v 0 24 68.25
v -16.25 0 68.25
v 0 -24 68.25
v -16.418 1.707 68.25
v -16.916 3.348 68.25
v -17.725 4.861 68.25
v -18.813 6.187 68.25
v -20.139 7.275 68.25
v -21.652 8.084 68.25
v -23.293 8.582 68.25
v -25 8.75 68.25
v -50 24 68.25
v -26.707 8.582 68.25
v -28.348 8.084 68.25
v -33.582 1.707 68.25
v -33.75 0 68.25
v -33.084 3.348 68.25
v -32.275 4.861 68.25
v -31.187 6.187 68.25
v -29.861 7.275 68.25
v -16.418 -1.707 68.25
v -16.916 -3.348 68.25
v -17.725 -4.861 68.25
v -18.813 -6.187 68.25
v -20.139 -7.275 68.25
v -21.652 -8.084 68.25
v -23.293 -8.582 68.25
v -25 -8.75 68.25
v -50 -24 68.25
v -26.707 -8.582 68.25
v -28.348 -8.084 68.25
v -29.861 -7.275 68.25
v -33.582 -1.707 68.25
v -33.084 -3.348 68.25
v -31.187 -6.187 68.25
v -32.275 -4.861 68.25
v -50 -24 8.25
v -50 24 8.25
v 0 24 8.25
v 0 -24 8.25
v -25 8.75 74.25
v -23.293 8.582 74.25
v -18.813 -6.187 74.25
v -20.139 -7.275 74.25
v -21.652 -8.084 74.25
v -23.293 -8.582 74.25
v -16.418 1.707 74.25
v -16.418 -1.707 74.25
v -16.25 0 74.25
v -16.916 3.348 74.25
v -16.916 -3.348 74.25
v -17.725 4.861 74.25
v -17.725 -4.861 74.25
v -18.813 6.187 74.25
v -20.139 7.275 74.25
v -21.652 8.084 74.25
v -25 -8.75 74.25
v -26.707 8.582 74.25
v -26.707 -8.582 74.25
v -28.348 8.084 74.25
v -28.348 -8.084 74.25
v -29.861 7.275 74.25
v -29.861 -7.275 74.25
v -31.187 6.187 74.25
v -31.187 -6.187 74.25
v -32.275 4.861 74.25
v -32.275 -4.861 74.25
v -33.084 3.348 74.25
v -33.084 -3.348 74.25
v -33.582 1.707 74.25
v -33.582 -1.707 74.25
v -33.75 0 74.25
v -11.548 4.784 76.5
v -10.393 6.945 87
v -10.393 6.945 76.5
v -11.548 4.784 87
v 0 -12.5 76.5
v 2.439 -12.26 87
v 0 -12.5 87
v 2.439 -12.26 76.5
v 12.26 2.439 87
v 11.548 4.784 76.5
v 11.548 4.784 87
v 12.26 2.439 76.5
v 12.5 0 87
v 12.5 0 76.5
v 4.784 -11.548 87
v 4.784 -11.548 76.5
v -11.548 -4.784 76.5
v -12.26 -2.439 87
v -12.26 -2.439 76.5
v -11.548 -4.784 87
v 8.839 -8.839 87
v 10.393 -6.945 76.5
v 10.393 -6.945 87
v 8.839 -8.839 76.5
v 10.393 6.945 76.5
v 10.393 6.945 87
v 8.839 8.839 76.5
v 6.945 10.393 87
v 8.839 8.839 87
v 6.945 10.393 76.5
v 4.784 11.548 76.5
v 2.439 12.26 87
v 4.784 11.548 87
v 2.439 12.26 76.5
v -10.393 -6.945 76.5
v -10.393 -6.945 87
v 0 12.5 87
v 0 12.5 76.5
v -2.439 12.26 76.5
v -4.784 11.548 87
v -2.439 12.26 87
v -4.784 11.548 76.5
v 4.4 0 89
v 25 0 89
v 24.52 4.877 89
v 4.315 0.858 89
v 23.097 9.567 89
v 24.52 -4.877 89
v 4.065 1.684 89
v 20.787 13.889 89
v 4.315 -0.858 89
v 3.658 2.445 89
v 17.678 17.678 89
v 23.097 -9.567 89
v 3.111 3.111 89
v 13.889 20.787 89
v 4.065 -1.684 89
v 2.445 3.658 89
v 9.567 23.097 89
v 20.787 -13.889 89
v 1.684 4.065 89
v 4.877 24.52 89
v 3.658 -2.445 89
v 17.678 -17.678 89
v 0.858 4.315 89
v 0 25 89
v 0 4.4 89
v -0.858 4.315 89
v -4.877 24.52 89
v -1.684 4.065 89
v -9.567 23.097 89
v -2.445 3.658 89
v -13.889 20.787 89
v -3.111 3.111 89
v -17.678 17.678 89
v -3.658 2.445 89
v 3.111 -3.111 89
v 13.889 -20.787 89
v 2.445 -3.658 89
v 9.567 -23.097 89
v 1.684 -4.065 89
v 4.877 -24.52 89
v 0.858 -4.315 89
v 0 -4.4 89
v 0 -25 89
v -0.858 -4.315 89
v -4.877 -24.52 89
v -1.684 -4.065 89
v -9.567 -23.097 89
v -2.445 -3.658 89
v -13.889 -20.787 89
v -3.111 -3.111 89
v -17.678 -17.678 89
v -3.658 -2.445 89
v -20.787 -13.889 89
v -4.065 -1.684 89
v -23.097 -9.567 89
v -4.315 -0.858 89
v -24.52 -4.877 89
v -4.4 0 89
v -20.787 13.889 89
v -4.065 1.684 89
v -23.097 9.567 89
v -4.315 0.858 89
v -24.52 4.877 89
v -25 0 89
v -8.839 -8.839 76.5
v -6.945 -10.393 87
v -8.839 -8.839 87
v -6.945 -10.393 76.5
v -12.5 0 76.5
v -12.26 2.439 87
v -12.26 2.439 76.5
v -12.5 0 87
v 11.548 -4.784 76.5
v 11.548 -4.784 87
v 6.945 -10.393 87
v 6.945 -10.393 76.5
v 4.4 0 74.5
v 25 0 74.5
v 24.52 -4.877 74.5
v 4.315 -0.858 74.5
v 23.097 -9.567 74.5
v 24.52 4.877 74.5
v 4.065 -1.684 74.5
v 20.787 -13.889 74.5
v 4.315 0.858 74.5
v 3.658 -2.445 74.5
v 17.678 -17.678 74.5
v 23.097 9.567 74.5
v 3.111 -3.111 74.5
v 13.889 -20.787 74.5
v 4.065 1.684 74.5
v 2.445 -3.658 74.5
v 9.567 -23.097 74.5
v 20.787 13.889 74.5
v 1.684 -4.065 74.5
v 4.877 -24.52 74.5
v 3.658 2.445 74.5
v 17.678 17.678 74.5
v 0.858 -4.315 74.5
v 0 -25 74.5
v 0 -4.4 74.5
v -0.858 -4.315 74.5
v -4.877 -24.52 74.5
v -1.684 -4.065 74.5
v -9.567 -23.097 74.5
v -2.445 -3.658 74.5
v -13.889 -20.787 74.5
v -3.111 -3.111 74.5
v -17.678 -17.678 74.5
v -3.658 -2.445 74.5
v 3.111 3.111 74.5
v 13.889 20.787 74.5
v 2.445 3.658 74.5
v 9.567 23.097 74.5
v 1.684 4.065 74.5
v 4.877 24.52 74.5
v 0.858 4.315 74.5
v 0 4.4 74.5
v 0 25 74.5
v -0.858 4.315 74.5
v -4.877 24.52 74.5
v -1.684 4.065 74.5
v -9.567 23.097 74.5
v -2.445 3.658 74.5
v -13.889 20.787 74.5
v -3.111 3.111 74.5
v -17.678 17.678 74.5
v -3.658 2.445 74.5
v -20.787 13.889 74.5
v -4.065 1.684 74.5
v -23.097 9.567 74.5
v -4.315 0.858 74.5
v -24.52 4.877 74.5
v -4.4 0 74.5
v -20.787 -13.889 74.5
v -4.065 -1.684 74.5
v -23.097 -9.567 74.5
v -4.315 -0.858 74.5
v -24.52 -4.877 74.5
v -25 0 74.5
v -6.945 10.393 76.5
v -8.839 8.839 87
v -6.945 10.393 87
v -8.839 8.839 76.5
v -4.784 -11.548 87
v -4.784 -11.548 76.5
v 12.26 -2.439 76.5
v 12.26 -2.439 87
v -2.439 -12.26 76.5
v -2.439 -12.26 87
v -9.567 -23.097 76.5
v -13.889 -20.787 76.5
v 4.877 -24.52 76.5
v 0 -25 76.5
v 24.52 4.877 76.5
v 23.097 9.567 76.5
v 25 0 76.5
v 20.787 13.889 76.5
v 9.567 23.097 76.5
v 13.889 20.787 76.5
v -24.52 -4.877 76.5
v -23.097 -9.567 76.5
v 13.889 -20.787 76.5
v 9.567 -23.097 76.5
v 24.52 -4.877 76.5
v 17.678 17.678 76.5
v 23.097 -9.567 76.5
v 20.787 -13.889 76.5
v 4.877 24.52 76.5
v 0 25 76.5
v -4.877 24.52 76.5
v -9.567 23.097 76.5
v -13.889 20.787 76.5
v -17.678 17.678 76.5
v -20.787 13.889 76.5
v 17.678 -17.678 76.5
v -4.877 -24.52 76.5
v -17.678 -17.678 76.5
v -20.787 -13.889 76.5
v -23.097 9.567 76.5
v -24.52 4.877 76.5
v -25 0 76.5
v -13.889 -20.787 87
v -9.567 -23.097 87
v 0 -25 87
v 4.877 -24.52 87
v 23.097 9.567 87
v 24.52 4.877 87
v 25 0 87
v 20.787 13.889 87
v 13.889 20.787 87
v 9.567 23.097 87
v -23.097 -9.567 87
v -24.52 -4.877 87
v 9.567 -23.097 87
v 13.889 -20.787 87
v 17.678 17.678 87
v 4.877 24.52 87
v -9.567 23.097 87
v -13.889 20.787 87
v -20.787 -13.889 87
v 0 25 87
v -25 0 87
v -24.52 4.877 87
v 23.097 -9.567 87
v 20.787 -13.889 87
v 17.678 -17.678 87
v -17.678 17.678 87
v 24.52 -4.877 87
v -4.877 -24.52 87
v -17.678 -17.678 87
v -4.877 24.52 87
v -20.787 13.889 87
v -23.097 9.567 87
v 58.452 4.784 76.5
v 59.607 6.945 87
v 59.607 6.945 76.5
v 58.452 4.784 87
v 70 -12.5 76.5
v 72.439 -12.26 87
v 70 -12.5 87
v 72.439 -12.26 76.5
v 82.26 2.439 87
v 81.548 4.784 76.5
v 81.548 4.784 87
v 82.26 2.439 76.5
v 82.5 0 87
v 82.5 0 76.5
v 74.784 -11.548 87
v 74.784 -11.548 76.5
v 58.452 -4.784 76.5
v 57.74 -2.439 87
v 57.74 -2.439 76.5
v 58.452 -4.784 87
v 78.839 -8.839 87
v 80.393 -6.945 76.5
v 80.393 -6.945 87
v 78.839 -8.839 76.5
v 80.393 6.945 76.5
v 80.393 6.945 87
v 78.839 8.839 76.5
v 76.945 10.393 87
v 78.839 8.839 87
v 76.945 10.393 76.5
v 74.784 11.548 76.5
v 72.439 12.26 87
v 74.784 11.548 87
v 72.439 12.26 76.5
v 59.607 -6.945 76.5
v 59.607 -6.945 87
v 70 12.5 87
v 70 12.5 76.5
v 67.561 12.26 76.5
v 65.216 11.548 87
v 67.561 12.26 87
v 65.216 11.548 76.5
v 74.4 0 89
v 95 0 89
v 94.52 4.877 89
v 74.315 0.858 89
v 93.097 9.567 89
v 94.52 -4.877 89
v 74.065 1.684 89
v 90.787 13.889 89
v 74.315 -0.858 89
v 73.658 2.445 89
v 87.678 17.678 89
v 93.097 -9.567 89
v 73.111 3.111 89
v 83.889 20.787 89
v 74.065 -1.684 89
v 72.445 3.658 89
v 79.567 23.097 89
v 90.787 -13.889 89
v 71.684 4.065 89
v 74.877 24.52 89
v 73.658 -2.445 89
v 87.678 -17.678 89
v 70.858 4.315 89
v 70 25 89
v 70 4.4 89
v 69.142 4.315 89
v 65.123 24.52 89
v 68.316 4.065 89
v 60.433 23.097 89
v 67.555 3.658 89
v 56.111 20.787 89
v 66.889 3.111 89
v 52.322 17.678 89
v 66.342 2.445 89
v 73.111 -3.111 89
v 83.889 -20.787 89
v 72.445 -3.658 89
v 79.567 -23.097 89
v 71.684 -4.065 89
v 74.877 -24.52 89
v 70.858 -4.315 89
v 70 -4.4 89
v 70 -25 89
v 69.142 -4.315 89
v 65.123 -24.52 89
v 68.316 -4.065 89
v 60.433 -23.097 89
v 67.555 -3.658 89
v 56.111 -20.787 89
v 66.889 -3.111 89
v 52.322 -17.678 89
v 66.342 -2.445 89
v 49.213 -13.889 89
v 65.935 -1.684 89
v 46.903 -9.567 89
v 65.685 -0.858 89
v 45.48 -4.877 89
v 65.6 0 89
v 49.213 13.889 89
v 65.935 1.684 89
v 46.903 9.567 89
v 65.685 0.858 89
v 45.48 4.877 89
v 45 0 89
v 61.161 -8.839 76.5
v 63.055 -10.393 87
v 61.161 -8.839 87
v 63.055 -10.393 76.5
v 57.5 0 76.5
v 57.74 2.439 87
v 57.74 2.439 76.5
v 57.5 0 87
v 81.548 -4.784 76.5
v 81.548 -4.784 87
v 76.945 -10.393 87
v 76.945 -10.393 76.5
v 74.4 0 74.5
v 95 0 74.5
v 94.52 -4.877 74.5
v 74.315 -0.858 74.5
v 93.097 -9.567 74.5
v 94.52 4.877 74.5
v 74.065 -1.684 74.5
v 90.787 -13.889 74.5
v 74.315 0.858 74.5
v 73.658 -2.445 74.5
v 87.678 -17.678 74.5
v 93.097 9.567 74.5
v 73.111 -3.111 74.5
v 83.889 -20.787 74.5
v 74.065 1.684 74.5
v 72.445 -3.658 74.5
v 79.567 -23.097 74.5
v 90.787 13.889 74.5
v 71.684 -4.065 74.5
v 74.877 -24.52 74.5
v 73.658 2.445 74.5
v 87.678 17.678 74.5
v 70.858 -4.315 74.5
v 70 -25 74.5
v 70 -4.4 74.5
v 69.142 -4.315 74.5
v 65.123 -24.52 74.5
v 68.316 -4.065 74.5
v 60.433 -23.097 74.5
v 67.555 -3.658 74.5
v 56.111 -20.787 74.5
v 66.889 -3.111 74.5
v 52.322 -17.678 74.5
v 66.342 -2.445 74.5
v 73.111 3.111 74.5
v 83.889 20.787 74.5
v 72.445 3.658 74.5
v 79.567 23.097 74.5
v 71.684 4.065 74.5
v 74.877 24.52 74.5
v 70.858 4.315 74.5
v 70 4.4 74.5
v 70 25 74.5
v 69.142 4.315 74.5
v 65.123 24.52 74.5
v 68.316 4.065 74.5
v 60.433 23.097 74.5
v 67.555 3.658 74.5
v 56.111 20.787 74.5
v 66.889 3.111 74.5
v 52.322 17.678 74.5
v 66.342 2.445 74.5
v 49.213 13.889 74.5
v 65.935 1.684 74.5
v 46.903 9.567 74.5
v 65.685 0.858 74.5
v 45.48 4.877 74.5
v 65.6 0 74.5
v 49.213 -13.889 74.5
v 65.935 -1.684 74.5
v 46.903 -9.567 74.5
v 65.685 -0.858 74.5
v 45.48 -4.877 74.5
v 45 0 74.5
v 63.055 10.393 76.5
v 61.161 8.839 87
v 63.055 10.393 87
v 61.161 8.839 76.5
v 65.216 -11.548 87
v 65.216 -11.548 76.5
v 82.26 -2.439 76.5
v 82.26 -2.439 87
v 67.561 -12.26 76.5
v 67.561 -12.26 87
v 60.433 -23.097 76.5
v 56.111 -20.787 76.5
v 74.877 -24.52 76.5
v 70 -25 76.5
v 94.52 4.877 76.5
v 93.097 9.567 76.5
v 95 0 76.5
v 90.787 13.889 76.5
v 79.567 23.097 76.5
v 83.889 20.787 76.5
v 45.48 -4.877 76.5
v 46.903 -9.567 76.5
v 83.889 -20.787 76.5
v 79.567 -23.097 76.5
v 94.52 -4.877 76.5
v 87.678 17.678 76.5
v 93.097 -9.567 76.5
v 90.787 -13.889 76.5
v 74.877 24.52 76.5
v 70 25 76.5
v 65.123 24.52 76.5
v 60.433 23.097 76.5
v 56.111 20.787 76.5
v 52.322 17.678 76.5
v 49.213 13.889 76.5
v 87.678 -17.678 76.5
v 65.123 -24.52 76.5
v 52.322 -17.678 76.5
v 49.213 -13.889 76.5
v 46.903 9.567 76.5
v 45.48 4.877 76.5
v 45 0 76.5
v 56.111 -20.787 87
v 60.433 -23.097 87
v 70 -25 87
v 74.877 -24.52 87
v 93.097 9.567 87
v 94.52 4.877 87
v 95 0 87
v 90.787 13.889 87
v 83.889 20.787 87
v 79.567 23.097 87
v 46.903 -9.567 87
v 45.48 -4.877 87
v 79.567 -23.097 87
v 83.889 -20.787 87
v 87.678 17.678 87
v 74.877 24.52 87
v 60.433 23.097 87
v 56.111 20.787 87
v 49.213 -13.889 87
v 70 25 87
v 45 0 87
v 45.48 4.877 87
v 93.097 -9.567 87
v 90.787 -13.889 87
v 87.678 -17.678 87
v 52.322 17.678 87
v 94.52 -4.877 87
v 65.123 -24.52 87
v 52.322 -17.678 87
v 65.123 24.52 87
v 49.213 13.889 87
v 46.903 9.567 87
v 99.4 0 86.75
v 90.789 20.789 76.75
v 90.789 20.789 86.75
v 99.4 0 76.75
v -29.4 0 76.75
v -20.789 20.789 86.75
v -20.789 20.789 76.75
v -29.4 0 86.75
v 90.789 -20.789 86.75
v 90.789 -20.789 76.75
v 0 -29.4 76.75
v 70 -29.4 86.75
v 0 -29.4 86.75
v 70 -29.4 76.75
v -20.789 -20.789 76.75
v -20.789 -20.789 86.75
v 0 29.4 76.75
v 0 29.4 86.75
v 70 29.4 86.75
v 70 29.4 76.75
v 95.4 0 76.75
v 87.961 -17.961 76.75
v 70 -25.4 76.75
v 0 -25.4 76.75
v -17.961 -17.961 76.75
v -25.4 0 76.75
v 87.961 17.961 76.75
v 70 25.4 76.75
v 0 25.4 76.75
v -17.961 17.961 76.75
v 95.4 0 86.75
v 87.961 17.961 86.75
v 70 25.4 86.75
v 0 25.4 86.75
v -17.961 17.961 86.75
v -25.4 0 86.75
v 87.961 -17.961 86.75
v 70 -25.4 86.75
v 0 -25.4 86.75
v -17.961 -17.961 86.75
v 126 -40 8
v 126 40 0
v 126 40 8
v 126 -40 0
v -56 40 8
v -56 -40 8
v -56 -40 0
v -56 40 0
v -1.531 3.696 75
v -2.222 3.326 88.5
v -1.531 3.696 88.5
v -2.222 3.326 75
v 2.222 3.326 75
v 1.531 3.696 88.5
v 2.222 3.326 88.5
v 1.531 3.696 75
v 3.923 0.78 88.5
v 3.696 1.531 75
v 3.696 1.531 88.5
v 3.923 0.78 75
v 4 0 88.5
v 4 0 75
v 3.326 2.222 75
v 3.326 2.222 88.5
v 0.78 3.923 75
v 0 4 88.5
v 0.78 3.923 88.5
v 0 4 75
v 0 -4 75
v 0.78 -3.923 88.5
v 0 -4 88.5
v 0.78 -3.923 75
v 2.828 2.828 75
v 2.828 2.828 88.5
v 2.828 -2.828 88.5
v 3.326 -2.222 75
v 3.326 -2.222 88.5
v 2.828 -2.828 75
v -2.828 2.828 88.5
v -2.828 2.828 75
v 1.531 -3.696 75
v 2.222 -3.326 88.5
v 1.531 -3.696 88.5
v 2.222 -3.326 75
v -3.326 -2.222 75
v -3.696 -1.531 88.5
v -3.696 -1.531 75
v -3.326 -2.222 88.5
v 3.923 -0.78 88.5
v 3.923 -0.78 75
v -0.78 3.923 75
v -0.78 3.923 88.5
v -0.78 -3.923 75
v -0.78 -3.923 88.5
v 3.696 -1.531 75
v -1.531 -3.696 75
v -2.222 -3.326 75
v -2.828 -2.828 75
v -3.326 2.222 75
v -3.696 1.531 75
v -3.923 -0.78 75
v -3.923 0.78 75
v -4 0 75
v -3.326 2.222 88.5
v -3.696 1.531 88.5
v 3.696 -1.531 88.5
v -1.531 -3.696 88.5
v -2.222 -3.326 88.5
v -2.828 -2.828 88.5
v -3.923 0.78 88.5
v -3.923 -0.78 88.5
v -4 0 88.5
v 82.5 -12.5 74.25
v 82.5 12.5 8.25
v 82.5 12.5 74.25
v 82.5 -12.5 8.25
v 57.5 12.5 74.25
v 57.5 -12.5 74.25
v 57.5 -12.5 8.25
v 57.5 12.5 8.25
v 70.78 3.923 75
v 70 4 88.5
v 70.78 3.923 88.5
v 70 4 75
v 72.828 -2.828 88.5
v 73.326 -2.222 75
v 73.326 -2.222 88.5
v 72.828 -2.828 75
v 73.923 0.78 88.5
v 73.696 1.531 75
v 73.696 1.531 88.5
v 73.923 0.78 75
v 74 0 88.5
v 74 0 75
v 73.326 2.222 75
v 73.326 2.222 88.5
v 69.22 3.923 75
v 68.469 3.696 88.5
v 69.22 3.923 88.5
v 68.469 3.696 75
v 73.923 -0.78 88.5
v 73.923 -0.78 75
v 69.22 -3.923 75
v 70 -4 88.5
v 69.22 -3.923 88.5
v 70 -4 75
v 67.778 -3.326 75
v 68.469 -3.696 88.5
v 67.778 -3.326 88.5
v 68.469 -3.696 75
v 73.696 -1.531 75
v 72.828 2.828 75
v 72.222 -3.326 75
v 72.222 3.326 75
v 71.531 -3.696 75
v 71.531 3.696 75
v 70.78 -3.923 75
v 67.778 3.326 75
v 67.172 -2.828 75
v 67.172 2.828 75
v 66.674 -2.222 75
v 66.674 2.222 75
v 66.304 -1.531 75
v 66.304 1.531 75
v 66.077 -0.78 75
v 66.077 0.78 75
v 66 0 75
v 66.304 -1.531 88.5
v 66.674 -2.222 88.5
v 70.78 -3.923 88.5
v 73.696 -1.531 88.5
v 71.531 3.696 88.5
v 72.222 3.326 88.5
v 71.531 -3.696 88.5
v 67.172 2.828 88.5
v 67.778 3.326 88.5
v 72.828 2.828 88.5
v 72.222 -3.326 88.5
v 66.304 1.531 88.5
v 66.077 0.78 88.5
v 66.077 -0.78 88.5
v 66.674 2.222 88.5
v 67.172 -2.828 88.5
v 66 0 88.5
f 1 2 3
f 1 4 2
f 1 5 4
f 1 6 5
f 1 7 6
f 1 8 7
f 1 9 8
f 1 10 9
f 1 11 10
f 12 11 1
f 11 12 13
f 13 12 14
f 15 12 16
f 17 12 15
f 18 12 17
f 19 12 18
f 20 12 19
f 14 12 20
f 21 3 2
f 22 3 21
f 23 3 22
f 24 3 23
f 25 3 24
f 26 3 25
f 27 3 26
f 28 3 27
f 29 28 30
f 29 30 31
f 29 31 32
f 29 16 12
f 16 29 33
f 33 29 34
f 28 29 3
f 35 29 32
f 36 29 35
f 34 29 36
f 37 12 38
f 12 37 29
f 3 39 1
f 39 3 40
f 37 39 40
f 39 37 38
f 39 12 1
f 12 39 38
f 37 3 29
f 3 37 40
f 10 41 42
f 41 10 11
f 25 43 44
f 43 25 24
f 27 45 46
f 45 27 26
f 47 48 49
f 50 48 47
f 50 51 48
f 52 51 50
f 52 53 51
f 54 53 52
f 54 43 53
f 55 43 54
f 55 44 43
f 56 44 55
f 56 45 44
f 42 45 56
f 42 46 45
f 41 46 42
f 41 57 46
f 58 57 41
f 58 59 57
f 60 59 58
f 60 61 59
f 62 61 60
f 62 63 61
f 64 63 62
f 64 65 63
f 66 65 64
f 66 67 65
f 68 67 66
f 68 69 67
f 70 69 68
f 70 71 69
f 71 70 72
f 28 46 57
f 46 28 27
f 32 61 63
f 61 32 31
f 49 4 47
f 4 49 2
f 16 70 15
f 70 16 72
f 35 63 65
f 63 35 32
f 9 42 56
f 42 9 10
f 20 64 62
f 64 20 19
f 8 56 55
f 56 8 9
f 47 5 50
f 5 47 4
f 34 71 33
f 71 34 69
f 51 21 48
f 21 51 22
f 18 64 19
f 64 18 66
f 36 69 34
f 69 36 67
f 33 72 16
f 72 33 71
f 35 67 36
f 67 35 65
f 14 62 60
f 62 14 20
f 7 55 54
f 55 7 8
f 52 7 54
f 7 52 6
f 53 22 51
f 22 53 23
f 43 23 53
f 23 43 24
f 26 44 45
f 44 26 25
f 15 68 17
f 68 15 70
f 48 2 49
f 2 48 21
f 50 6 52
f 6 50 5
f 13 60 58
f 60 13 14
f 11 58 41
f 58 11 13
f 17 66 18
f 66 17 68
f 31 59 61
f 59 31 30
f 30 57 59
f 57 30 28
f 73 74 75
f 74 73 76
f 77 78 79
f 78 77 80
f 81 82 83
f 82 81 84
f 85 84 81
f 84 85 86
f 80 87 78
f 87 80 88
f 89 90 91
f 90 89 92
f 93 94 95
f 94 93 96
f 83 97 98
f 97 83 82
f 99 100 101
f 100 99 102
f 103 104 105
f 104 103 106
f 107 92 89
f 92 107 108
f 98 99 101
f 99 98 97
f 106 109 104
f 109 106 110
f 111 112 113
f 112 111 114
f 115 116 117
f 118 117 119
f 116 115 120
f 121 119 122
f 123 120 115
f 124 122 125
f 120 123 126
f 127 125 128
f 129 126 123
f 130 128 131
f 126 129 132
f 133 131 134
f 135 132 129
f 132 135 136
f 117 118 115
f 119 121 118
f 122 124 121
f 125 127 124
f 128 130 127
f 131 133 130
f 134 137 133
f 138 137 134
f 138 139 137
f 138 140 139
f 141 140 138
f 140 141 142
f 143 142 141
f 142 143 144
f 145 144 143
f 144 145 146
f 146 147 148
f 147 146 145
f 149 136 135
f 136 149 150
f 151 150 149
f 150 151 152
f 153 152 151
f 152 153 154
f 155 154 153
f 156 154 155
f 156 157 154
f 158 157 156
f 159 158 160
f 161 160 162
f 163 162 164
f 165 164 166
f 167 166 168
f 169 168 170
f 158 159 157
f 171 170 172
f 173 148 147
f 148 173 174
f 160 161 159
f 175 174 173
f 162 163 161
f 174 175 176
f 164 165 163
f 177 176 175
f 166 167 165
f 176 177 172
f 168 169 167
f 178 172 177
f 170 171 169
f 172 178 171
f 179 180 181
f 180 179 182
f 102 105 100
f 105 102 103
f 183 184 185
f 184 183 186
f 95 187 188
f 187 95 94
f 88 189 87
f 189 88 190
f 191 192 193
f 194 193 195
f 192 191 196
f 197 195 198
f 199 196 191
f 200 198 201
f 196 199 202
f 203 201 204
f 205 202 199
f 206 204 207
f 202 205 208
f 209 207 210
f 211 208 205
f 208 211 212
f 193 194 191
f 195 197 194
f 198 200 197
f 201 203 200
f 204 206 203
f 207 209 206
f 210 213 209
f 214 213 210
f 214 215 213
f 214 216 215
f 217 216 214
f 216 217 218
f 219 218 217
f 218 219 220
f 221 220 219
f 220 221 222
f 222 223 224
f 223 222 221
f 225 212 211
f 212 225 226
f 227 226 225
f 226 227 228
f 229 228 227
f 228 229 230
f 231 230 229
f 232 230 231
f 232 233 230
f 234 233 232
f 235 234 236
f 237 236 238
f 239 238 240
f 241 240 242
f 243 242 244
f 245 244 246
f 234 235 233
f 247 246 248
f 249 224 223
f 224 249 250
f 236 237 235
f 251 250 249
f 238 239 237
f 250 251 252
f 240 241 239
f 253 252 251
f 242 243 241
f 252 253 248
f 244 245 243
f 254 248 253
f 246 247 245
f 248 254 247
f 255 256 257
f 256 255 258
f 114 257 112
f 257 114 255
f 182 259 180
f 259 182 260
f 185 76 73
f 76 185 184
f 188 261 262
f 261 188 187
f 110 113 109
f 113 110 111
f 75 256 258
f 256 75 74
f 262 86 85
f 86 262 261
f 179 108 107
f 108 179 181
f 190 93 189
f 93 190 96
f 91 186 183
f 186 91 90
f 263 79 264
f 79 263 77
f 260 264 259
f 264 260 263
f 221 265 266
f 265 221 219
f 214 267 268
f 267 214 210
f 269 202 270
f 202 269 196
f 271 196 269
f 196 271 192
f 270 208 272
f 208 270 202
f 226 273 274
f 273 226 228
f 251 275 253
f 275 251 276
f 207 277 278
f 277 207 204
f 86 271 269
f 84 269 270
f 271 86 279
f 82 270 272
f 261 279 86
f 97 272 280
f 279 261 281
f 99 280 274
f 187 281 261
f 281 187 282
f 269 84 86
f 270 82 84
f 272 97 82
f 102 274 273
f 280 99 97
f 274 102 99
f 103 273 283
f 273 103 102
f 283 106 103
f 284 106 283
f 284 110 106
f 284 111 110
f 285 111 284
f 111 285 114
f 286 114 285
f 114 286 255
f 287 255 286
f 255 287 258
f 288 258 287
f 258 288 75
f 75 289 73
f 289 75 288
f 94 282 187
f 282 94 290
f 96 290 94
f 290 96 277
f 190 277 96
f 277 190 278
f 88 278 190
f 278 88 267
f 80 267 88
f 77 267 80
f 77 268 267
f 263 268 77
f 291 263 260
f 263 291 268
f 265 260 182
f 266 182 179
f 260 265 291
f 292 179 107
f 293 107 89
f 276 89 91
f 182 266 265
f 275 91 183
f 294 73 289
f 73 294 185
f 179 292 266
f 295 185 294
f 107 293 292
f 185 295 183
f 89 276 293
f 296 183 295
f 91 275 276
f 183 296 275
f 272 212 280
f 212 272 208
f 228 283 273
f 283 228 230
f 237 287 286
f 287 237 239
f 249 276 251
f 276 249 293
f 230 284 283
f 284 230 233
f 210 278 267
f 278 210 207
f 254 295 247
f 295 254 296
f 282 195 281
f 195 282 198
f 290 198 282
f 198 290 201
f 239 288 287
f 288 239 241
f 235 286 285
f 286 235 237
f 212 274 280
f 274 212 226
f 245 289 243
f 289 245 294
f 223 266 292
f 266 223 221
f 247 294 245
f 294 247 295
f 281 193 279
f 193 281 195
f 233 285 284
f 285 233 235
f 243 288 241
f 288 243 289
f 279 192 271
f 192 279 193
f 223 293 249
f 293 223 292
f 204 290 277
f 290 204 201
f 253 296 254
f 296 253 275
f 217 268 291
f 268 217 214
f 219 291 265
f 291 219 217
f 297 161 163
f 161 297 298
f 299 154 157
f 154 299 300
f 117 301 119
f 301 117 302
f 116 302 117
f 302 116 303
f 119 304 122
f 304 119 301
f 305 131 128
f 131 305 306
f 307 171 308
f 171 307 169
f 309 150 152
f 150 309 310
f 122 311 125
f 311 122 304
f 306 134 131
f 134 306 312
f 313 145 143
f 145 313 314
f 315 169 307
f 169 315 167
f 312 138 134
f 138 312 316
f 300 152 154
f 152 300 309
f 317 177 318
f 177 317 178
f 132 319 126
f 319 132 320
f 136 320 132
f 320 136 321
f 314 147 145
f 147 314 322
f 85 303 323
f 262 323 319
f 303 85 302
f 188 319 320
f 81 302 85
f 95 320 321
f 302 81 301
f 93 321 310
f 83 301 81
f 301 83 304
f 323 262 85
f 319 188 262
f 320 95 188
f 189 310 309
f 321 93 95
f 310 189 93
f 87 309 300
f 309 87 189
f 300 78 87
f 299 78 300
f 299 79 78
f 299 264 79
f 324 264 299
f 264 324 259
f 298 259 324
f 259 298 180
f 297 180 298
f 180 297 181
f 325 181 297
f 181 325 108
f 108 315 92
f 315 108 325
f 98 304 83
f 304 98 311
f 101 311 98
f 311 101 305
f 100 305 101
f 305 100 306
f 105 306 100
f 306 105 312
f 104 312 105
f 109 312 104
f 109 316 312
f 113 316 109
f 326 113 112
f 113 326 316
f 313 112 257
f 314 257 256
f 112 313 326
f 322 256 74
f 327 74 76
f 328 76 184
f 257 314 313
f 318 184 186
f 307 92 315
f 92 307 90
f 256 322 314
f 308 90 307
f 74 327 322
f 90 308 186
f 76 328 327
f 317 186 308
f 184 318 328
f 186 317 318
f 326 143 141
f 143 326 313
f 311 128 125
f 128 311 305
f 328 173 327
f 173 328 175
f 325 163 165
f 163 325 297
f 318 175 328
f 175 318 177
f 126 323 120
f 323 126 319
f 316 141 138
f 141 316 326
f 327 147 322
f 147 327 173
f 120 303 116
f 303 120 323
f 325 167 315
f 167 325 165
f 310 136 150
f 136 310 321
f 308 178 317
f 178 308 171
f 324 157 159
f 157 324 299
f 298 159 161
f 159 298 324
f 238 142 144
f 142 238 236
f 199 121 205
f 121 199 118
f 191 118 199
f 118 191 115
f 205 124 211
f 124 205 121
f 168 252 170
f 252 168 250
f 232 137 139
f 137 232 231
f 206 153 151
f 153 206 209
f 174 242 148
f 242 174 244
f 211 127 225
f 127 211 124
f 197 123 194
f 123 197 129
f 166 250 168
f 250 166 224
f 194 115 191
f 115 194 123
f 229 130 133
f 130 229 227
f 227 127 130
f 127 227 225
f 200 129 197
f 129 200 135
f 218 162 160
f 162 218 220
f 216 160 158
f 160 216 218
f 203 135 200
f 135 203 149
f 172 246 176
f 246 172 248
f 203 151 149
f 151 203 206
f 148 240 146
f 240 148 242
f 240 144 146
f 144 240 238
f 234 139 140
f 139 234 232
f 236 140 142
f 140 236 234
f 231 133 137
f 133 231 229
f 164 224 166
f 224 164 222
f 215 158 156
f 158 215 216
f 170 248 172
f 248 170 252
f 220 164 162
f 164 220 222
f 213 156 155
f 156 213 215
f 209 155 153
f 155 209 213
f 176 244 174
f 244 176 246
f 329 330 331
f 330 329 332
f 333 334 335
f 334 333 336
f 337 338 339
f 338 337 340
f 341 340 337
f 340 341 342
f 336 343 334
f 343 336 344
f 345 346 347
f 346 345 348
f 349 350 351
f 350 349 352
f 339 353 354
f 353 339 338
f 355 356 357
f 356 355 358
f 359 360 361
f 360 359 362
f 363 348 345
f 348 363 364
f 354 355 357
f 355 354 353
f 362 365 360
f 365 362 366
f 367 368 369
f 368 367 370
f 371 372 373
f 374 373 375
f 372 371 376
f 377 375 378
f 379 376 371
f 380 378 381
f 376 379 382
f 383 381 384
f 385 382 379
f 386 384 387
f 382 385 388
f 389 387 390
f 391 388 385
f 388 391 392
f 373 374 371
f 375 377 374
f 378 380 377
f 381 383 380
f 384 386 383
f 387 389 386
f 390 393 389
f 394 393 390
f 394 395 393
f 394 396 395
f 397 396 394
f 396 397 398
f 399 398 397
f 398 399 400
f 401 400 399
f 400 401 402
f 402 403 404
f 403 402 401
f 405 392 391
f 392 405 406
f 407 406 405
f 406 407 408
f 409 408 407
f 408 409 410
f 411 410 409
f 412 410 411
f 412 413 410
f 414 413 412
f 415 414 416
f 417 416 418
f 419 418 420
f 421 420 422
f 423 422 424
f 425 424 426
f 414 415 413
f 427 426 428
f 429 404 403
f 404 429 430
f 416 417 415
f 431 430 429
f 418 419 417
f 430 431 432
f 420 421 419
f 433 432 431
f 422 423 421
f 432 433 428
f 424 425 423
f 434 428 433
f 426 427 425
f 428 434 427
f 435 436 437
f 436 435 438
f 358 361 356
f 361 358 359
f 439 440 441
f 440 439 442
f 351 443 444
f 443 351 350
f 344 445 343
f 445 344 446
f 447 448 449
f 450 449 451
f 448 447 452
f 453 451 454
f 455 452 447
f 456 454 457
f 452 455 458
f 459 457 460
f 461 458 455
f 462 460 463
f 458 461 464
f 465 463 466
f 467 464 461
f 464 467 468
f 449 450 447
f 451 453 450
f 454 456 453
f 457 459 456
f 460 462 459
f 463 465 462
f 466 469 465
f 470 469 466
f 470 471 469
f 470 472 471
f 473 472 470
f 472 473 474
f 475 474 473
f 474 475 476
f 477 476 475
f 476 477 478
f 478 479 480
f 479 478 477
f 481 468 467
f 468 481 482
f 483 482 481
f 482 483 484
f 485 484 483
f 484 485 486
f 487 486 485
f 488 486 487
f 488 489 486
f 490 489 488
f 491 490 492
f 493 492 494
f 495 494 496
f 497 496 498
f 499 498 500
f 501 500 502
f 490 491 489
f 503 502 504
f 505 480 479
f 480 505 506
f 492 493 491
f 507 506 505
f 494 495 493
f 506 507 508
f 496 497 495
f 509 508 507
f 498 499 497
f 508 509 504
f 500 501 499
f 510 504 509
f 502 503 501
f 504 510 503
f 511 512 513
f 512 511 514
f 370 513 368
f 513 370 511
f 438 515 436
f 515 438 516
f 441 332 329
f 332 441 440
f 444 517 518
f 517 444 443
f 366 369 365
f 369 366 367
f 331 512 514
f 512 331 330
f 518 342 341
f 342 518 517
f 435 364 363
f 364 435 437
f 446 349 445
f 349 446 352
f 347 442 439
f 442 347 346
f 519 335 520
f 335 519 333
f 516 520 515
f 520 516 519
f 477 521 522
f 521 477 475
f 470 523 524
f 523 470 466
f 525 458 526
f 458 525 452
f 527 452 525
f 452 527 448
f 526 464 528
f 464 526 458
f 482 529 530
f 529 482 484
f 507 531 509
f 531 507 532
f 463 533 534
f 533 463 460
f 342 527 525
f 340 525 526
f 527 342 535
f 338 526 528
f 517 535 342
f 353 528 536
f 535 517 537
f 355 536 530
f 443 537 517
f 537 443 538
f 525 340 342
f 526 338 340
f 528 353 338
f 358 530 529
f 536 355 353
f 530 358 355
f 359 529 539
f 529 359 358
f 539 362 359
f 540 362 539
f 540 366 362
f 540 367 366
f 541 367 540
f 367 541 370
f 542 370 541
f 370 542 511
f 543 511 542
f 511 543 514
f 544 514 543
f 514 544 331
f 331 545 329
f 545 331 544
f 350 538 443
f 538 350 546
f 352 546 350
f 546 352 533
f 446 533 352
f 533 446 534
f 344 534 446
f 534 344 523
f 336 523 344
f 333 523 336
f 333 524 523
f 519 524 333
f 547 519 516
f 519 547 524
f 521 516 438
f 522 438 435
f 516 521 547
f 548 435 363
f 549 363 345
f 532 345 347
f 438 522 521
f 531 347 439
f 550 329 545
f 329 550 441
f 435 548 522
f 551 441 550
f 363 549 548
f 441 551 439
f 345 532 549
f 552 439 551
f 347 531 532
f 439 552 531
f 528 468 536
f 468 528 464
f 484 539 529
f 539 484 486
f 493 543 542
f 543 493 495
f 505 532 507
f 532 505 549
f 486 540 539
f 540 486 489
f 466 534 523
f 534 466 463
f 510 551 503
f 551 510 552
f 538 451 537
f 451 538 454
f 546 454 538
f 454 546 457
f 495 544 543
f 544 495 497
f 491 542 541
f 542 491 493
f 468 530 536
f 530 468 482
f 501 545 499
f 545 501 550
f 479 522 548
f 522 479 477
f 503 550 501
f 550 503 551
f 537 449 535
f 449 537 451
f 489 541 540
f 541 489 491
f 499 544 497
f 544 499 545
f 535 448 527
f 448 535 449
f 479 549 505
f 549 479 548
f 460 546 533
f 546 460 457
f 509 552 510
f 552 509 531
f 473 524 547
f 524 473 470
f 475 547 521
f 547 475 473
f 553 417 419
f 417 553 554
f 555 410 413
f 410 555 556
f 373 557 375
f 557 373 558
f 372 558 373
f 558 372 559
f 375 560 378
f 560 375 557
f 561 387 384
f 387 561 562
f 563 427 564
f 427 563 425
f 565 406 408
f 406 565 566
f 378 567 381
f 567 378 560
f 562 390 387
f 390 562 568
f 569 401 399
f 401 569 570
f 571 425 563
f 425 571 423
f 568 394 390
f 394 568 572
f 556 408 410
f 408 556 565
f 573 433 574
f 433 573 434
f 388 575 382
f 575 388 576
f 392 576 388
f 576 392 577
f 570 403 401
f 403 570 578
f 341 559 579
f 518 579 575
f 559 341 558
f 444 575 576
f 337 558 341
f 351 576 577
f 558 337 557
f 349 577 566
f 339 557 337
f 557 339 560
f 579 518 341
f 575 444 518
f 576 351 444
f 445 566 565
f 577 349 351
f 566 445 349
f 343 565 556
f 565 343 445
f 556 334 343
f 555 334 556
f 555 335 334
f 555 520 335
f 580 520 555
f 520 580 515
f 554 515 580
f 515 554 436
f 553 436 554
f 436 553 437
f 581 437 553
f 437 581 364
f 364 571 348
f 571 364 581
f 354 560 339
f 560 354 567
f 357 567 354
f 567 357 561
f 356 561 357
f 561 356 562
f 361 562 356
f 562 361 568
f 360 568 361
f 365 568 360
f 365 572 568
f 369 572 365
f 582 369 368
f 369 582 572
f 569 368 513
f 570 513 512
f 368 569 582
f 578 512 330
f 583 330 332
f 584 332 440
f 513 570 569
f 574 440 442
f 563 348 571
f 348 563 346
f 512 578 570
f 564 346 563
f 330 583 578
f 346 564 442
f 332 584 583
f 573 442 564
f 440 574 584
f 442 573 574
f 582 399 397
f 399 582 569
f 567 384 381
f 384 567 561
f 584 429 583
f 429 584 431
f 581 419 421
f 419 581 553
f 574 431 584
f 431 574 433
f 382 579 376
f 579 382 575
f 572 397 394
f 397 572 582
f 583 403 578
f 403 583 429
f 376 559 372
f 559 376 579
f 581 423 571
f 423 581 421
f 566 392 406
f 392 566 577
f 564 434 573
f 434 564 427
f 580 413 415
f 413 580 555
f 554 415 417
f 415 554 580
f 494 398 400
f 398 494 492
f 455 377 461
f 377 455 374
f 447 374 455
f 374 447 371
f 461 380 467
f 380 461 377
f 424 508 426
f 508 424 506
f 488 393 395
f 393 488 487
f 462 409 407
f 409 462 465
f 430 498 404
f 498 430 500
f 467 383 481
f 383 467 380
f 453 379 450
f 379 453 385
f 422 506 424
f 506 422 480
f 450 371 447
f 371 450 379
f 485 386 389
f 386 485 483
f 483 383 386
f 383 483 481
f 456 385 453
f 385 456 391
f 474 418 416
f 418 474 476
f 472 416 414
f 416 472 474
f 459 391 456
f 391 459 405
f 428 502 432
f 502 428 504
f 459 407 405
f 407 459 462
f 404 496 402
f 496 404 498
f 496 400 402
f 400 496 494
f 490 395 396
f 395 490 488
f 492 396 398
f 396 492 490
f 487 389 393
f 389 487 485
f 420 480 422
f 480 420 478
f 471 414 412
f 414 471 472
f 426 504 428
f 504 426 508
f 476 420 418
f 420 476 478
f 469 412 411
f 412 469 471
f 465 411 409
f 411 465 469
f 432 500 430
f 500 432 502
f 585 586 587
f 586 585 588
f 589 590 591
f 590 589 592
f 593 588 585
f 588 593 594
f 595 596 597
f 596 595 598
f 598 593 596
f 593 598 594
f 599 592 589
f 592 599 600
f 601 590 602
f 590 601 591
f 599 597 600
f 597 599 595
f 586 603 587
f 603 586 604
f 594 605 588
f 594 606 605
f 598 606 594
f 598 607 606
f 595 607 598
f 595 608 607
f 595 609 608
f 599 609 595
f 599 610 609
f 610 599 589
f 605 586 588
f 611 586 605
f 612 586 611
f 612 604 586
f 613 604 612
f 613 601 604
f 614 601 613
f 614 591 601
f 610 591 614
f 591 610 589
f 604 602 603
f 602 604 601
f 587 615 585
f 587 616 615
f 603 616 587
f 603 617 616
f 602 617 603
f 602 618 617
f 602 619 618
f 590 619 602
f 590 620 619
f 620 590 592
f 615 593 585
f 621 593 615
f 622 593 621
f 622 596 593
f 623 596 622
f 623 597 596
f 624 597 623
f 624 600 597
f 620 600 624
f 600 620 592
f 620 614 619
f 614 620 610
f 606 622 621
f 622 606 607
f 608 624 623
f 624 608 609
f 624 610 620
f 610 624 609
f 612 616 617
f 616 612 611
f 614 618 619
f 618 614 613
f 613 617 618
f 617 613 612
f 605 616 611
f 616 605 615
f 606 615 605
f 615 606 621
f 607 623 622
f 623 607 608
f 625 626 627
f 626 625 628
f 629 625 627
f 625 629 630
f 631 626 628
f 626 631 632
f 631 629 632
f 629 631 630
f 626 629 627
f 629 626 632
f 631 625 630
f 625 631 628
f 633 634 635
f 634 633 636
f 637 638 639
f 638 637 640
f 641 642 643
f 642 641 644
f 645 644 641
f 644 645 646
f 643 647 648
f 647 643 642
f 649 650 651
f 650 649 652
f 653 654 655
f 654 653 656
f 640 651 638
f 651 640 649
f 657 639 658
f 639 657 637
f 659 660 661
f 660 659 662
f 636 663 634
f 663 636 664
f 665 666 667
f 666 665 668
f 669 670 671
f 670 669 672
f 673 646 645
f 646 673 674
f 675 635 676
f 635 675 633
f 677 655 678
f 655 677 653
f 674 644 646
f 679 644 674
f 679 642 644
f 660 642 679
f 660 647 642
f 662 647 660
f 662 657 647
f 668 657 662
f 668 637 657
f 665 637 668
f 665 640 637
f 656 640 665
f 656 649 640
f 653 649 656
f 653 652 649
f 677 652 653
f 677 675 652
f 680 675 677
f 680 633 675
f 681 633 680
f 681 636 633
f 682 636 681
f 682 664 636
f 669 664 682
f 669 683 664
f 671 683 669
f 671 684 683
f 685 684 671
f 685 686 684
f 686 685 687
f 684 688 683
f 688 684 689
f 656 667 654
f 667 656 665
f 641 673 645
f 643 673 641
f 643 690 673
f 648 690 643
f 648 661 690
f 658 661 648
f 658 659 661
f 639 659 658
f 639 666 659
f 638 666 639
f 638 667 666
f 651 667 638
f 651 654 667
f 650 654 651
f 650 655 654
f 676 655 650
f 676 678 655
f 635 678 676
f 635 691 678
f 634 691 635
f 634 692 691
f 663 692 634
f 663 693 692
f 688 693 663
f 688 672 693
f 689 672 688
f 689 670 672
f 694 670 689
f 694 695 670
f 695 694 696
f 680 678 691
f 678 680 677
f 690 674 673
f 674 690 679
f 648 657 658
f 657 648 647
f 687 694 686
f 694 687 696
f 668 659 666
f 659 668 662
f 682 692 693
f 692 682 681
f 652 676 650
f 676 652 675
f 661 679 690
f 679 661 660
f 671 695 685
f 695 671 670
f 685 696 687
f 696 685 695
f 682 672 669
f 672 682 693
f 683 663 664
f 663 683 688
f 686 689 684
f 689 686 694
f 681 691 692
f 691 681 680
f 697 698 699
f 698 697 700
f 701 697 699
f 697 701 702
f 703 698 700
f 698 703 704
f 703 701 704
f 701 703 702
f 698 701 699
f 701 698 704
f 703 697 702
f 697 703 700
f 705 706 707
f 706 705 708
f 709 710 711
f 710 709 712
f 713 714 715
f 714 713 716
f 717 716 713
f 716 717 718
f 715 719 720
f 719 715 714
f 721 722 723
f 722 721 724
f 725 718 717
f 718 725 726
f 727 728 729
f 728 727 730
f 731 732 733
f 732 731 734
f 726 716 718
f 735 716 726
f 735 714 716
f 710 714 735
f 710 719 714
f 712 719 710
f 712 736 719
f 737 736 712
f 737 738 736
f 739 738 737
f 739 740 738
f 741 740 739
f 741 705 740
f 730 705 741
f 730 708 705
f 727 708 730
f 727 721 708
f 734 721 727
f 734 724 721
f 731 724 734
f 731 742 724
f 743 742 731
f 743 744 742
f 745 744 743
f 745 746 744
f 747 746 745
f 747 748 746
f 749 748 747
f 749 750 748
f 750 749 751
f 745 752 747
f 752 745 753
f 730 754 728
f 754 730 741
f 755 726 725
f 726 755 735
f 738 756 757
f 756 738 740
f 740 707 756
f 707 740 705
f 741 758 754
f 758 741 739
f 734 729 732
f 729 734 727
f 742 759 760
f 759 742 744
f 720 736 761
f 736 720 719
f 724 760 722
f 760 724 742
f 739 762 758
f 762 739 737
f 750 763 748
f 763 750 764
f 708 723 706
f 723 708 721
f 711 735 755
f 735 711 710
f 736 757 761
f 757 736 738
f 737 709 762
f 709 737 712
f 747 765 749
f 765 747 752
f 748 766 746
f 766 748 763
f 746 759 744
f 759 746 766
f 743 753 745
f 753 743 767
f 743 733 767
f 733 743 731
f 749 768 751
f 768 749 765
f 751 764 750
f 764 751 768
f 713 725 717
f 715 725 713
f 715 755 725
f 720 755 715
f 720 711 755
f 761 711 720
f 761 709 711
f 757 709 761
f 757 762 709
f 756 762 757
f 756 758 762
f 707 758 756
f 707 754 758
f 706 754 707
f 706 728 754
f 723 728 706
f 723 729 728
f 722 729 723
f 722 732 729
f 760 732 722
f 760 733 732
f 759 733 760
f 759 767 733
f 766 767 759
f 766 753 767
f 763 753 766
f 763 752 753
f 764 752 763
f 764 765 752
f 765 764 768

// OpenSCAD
$fn = 32;

// ------------------------------------------------------------------------
// Motor belt drive: span 70 mm, pulleys d50, belt 10 mm wide
// Every part is its own module, assembly() places every instance.
// ------------------------------------------------------------------------

// --- part 1 ---
module base_plate() {
  difference() {
    translate([-91, -40, 0]) cube([182, 80, 8]);
  }
}

// --- part 2 ---
module motor() {
  union() {
    translate([-30, -24, 0]) cube([60, 48, 50]);
    translate([33, 0, 25]) rotate([0, 90, 0]) cylinder(h = 6, d = 17.5, center = true);
  }
}

// --- part 3 ---
module drive_shaft() {
  translate([0, 0, -6.75]) cylinder(h = 13.5, d = 8);
}

// --- part 4 ---
module pulley_drive() {
  difference() {
    union() {
      cylinder(h = 14.5, d = 25);
      cylinder(h = 2, d = 50);
      translate([0, 0, 12.5]) cylinder(h = 2, d = 50);
    }
    translate([0, 0, -1]) cylinder(h = 16.5, d = 8.8);
  }
}

// --- part 5 ---
module idler_post() {
  translate([-12.5, -12.5, 0]) cube([25, 25, 66]);
}

// --- part 6 ---
module driven_shaft() {
  translate([0, 0, -6.75]) cylinder(h = 13.5, d = 8);
}

// --- part 7 ---
module pulley_driven() {
  difference() {
    union() {
      cylinder(h = 14.5, d = 25);
      cylinder(h = 2, d = 50);
      translate([0, 0, 12.5]) cylinder(h = 2, d = 50);
    }
    translate([0, 0, -1]) cylinder(h = 16.5, d = 8.8);
  }
}

// --- part 8 ---
module drive_belt() {
  difference() {
    linear_extrude(height = 10) polygon(points = concat([for (a = [90 : 45 : 270]) [29.4 * cos(a), 29.4 * sin(a)]], [for (a = [270 : 45 : 450]) [70 + 29.4 * cos(a), 29.4 * sin(a)]]));
    translate([0, 0, -1]) linear_extrude(height = 12) polygon(points = concat([for (a = [90 : 45 : 270]) [25.4 * cos(a), 25.4 * sin(a)]], [for (a = [270 : 45 : 450]) [70 + 25.4 * cos(a), 25.4 * sin(a)]]));
  }
}

// --- assembly ---
module assembly() {
  color([0.80, 0.24, 0.20]) translate([35, 0, 0]) rotate([0, 0, 0]) base_plate();
  color([0.20, 0.45, 0.75]) translate([0, 0, 38.25]) rotate([0, 270, 0]) motor();
  color([0.25, 0.62, 0.32]) translate([0, 0, 81.75]) rotate([0, 0, 0]) drive_shaft();
  color([0.92, 0.70, 0.18]) translate([0, 0, 74.5]) rotate([0, 0, 0]) pulley_drive();
  color([0.58, 0.35, 0.70]) translate([70, 0, 8.25]) rotate([0, 0, 0]) idler_post();
  color([0.16, 0.66, 0.66]) translate([70, 0, 81.75]) rotate([0, 0, 0]) driven_shaft();
  color([0.85, 0.48, 0.18]) translate([70, 0, 74.5]) rotate([0, 0, 0]) pulley_driven();
  color([0.55, 0.60, 0.65]) translate([0, 0, 76.75]) rotate([0, 0, 0]) drive_belt();
}

assembly();
